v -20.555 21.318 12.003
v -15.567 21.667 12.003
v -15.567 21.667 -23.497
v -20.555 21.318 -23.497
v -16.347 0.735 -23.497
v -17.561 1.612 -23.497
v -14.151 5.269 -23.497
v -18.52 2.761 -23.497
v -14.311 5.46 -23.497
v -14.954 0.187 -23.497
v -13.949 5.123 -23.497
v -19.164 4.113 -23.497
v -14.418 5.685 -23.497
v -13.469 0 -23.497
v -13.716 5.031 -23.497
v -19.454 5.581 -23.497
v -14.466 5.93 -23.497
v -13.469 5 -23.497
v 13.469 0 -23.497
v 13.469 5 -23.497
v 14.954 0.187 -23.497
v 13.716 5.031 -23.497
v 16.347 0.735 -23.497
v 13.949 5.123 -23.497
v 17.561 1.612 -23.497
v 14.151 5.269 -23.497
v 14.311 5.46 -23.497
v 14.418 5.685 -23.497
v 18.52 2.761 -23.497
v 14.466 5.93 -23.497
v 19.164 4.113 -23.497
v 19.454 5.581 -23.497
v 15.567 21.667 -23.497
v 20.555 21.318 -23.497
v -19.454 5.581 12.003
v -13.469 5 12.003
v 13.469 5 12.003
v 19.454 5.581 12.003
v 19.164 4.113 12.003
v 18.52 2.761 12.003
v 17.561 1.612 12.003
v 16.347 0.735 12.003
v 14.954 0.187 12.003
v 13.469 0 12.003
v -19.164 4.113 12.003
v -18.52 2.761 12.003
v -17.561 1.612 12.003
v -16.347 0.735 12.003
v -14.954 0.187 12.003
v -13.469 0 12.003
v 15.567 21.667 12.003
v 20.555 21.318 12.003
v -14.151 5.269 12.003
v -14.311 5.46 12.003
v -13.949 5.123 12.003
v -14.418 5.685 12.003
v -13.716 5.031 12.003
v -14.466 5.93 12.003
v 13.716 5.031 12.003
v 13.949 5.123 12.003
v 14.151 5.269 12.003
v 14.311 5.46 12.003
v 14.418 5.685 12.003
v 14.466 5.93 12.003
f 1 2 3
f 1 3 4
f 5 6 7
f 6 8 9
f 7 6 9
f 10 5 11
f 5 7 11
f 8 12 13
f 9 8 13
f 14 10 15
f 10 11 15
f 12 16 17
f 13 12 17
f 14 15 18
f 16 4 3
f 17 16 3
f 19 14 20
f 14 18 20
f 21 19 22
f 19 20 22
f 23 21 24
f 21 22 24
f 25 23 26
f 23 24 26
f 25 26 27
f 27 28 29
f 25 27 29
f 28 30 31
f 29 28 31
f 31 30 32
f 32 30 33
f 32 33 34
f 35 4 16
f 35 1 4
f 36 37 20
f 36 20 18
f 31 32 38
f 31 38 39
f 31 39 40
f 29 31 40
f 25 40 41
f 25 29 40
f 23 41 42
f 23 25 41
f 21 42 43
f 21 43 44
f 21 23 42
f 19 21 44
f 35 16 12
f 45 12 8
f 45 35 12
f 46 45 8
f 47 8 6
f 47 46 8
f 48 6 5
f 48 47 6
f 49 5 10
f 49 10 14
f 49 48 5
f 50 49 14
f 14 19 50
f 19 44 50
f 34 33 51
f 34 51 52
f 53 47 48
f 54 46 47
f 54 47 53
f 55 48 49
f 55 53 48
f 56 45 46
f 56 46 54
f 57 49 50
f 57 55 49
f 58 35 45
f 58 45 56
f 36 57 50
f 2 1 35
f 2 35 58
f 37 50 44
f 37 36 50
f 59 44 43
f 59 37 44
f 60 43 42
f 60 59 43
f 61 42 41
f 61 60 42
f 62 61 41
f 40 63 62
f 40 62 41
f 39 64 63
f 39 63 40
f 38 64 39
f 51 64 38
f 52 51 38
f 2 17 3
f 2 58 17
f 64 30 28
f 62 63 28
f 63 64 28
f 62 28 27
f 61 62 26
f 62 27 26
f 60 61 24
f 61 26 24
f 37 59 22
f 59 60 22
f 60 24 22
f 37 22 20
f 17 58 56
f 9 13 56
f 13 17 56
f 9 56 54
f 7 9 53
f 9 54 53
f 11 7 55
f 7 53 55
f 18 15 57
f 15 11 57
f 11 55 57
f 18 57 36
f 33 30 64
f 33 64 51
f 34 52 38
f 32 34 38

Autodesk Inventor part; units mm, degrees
ref_plane "YZ Plane" through (0, 0, 0) normal (1, 0, 0) x (0, 1, 0)
ref_plane "XZ Plane" through (0, 0, 0) normal (0, 1, 0) x (-1, 0, 0)
ref_plane "XY Plane" through (0, 0, 0) normal (0, 0, 1) x (1, 0, 0)
sketch "Sketch1" plane through (0, 0, 0) normal (0, 1, 0) x (-1, 0, 0)
  line L0 (0, 0) -> (0, -27.002) construction
  line L1 (19.064, 12.0028) -> (-19.064, 12.0028)
  line L2 (-19.064, 12.0028) -> (-19.064, -23.4972)
  line L3 (-19.064, -23.4972) -> (19.064, -23.4972)
  line L4 (19.064, -23.4972) -> (19.064, 12.0028)
  dimension "d0" = 35.5
  dimension "d12" = 38.128
extrude "Plate1" add sketch "Sketch1" along normal blind 5
sketch "Sketch2" plane through (-14.0762, 0.3488, 12.0028) normal (-0.9975641, -0.0697565, 0) x (0.0697565, -0.9975641, 0)
  line L0 (0, -35.5) -> (0, 0)
  line L1 (0, 0) -> (-21.37, 0)
  line L2 (-21.37, 0) -> (-21.37, -35.5)
  line L3 (-21.37, -35.5) -> (0, -35.5)
edge flange "Flange1" height 21.37 angle 86 thickness 5 bend radius 1 thickness toward (-0.9975641, -0.0697565, 0) relief tear relief width 5 relief depth 2.5 corner gap 1 corner form 0 edges at (-19.064, 5, -5.7472) (19.064, 5, -5.7472) wall of the first edge with corners at (-14.0762, 0.3488, -23.4972) (-14.0762, 0.3488, 12.0028) (-15.5669, 21.6667, 12.0028) (-15.5669, 21.6667, -23.4972)
bend "Bend1"
corner "Corner1"
equation "\"d1\" = Thickness"
equation "\"d2\" = BendReliefWidth"
equation "\"d3\" = BendReliefDepth"
equation "\"d4\" = MinimumRemnant"
equation "\"d5\" = TransitionRadius"
equation "\"d8\" = BendRadius"
equation "\"d9\" = CornerReliefSize"
equation "\"d10\" = GapSize"
equation "\"d11\" = JacobiRadiusSize"
equation "\"BendReliefWidth\" = Thickness"
equation "\"BendReliefDepth\" = 0.5 * Thickness"
equation "\"TransitionRadius\" = BendRadius"
equation "\"JacobiRadiusSize\" = BendRadius"
equation "\"GapSize\" = Thickness"
equation "\"Thickness\" = 5"
equation "\"MinimumRemnant\" = 10"
equation "\"BendRadius\" = 1"
equation "\"CornerReliefSize\" = 20"
properties part number "øre" material "Steel"
